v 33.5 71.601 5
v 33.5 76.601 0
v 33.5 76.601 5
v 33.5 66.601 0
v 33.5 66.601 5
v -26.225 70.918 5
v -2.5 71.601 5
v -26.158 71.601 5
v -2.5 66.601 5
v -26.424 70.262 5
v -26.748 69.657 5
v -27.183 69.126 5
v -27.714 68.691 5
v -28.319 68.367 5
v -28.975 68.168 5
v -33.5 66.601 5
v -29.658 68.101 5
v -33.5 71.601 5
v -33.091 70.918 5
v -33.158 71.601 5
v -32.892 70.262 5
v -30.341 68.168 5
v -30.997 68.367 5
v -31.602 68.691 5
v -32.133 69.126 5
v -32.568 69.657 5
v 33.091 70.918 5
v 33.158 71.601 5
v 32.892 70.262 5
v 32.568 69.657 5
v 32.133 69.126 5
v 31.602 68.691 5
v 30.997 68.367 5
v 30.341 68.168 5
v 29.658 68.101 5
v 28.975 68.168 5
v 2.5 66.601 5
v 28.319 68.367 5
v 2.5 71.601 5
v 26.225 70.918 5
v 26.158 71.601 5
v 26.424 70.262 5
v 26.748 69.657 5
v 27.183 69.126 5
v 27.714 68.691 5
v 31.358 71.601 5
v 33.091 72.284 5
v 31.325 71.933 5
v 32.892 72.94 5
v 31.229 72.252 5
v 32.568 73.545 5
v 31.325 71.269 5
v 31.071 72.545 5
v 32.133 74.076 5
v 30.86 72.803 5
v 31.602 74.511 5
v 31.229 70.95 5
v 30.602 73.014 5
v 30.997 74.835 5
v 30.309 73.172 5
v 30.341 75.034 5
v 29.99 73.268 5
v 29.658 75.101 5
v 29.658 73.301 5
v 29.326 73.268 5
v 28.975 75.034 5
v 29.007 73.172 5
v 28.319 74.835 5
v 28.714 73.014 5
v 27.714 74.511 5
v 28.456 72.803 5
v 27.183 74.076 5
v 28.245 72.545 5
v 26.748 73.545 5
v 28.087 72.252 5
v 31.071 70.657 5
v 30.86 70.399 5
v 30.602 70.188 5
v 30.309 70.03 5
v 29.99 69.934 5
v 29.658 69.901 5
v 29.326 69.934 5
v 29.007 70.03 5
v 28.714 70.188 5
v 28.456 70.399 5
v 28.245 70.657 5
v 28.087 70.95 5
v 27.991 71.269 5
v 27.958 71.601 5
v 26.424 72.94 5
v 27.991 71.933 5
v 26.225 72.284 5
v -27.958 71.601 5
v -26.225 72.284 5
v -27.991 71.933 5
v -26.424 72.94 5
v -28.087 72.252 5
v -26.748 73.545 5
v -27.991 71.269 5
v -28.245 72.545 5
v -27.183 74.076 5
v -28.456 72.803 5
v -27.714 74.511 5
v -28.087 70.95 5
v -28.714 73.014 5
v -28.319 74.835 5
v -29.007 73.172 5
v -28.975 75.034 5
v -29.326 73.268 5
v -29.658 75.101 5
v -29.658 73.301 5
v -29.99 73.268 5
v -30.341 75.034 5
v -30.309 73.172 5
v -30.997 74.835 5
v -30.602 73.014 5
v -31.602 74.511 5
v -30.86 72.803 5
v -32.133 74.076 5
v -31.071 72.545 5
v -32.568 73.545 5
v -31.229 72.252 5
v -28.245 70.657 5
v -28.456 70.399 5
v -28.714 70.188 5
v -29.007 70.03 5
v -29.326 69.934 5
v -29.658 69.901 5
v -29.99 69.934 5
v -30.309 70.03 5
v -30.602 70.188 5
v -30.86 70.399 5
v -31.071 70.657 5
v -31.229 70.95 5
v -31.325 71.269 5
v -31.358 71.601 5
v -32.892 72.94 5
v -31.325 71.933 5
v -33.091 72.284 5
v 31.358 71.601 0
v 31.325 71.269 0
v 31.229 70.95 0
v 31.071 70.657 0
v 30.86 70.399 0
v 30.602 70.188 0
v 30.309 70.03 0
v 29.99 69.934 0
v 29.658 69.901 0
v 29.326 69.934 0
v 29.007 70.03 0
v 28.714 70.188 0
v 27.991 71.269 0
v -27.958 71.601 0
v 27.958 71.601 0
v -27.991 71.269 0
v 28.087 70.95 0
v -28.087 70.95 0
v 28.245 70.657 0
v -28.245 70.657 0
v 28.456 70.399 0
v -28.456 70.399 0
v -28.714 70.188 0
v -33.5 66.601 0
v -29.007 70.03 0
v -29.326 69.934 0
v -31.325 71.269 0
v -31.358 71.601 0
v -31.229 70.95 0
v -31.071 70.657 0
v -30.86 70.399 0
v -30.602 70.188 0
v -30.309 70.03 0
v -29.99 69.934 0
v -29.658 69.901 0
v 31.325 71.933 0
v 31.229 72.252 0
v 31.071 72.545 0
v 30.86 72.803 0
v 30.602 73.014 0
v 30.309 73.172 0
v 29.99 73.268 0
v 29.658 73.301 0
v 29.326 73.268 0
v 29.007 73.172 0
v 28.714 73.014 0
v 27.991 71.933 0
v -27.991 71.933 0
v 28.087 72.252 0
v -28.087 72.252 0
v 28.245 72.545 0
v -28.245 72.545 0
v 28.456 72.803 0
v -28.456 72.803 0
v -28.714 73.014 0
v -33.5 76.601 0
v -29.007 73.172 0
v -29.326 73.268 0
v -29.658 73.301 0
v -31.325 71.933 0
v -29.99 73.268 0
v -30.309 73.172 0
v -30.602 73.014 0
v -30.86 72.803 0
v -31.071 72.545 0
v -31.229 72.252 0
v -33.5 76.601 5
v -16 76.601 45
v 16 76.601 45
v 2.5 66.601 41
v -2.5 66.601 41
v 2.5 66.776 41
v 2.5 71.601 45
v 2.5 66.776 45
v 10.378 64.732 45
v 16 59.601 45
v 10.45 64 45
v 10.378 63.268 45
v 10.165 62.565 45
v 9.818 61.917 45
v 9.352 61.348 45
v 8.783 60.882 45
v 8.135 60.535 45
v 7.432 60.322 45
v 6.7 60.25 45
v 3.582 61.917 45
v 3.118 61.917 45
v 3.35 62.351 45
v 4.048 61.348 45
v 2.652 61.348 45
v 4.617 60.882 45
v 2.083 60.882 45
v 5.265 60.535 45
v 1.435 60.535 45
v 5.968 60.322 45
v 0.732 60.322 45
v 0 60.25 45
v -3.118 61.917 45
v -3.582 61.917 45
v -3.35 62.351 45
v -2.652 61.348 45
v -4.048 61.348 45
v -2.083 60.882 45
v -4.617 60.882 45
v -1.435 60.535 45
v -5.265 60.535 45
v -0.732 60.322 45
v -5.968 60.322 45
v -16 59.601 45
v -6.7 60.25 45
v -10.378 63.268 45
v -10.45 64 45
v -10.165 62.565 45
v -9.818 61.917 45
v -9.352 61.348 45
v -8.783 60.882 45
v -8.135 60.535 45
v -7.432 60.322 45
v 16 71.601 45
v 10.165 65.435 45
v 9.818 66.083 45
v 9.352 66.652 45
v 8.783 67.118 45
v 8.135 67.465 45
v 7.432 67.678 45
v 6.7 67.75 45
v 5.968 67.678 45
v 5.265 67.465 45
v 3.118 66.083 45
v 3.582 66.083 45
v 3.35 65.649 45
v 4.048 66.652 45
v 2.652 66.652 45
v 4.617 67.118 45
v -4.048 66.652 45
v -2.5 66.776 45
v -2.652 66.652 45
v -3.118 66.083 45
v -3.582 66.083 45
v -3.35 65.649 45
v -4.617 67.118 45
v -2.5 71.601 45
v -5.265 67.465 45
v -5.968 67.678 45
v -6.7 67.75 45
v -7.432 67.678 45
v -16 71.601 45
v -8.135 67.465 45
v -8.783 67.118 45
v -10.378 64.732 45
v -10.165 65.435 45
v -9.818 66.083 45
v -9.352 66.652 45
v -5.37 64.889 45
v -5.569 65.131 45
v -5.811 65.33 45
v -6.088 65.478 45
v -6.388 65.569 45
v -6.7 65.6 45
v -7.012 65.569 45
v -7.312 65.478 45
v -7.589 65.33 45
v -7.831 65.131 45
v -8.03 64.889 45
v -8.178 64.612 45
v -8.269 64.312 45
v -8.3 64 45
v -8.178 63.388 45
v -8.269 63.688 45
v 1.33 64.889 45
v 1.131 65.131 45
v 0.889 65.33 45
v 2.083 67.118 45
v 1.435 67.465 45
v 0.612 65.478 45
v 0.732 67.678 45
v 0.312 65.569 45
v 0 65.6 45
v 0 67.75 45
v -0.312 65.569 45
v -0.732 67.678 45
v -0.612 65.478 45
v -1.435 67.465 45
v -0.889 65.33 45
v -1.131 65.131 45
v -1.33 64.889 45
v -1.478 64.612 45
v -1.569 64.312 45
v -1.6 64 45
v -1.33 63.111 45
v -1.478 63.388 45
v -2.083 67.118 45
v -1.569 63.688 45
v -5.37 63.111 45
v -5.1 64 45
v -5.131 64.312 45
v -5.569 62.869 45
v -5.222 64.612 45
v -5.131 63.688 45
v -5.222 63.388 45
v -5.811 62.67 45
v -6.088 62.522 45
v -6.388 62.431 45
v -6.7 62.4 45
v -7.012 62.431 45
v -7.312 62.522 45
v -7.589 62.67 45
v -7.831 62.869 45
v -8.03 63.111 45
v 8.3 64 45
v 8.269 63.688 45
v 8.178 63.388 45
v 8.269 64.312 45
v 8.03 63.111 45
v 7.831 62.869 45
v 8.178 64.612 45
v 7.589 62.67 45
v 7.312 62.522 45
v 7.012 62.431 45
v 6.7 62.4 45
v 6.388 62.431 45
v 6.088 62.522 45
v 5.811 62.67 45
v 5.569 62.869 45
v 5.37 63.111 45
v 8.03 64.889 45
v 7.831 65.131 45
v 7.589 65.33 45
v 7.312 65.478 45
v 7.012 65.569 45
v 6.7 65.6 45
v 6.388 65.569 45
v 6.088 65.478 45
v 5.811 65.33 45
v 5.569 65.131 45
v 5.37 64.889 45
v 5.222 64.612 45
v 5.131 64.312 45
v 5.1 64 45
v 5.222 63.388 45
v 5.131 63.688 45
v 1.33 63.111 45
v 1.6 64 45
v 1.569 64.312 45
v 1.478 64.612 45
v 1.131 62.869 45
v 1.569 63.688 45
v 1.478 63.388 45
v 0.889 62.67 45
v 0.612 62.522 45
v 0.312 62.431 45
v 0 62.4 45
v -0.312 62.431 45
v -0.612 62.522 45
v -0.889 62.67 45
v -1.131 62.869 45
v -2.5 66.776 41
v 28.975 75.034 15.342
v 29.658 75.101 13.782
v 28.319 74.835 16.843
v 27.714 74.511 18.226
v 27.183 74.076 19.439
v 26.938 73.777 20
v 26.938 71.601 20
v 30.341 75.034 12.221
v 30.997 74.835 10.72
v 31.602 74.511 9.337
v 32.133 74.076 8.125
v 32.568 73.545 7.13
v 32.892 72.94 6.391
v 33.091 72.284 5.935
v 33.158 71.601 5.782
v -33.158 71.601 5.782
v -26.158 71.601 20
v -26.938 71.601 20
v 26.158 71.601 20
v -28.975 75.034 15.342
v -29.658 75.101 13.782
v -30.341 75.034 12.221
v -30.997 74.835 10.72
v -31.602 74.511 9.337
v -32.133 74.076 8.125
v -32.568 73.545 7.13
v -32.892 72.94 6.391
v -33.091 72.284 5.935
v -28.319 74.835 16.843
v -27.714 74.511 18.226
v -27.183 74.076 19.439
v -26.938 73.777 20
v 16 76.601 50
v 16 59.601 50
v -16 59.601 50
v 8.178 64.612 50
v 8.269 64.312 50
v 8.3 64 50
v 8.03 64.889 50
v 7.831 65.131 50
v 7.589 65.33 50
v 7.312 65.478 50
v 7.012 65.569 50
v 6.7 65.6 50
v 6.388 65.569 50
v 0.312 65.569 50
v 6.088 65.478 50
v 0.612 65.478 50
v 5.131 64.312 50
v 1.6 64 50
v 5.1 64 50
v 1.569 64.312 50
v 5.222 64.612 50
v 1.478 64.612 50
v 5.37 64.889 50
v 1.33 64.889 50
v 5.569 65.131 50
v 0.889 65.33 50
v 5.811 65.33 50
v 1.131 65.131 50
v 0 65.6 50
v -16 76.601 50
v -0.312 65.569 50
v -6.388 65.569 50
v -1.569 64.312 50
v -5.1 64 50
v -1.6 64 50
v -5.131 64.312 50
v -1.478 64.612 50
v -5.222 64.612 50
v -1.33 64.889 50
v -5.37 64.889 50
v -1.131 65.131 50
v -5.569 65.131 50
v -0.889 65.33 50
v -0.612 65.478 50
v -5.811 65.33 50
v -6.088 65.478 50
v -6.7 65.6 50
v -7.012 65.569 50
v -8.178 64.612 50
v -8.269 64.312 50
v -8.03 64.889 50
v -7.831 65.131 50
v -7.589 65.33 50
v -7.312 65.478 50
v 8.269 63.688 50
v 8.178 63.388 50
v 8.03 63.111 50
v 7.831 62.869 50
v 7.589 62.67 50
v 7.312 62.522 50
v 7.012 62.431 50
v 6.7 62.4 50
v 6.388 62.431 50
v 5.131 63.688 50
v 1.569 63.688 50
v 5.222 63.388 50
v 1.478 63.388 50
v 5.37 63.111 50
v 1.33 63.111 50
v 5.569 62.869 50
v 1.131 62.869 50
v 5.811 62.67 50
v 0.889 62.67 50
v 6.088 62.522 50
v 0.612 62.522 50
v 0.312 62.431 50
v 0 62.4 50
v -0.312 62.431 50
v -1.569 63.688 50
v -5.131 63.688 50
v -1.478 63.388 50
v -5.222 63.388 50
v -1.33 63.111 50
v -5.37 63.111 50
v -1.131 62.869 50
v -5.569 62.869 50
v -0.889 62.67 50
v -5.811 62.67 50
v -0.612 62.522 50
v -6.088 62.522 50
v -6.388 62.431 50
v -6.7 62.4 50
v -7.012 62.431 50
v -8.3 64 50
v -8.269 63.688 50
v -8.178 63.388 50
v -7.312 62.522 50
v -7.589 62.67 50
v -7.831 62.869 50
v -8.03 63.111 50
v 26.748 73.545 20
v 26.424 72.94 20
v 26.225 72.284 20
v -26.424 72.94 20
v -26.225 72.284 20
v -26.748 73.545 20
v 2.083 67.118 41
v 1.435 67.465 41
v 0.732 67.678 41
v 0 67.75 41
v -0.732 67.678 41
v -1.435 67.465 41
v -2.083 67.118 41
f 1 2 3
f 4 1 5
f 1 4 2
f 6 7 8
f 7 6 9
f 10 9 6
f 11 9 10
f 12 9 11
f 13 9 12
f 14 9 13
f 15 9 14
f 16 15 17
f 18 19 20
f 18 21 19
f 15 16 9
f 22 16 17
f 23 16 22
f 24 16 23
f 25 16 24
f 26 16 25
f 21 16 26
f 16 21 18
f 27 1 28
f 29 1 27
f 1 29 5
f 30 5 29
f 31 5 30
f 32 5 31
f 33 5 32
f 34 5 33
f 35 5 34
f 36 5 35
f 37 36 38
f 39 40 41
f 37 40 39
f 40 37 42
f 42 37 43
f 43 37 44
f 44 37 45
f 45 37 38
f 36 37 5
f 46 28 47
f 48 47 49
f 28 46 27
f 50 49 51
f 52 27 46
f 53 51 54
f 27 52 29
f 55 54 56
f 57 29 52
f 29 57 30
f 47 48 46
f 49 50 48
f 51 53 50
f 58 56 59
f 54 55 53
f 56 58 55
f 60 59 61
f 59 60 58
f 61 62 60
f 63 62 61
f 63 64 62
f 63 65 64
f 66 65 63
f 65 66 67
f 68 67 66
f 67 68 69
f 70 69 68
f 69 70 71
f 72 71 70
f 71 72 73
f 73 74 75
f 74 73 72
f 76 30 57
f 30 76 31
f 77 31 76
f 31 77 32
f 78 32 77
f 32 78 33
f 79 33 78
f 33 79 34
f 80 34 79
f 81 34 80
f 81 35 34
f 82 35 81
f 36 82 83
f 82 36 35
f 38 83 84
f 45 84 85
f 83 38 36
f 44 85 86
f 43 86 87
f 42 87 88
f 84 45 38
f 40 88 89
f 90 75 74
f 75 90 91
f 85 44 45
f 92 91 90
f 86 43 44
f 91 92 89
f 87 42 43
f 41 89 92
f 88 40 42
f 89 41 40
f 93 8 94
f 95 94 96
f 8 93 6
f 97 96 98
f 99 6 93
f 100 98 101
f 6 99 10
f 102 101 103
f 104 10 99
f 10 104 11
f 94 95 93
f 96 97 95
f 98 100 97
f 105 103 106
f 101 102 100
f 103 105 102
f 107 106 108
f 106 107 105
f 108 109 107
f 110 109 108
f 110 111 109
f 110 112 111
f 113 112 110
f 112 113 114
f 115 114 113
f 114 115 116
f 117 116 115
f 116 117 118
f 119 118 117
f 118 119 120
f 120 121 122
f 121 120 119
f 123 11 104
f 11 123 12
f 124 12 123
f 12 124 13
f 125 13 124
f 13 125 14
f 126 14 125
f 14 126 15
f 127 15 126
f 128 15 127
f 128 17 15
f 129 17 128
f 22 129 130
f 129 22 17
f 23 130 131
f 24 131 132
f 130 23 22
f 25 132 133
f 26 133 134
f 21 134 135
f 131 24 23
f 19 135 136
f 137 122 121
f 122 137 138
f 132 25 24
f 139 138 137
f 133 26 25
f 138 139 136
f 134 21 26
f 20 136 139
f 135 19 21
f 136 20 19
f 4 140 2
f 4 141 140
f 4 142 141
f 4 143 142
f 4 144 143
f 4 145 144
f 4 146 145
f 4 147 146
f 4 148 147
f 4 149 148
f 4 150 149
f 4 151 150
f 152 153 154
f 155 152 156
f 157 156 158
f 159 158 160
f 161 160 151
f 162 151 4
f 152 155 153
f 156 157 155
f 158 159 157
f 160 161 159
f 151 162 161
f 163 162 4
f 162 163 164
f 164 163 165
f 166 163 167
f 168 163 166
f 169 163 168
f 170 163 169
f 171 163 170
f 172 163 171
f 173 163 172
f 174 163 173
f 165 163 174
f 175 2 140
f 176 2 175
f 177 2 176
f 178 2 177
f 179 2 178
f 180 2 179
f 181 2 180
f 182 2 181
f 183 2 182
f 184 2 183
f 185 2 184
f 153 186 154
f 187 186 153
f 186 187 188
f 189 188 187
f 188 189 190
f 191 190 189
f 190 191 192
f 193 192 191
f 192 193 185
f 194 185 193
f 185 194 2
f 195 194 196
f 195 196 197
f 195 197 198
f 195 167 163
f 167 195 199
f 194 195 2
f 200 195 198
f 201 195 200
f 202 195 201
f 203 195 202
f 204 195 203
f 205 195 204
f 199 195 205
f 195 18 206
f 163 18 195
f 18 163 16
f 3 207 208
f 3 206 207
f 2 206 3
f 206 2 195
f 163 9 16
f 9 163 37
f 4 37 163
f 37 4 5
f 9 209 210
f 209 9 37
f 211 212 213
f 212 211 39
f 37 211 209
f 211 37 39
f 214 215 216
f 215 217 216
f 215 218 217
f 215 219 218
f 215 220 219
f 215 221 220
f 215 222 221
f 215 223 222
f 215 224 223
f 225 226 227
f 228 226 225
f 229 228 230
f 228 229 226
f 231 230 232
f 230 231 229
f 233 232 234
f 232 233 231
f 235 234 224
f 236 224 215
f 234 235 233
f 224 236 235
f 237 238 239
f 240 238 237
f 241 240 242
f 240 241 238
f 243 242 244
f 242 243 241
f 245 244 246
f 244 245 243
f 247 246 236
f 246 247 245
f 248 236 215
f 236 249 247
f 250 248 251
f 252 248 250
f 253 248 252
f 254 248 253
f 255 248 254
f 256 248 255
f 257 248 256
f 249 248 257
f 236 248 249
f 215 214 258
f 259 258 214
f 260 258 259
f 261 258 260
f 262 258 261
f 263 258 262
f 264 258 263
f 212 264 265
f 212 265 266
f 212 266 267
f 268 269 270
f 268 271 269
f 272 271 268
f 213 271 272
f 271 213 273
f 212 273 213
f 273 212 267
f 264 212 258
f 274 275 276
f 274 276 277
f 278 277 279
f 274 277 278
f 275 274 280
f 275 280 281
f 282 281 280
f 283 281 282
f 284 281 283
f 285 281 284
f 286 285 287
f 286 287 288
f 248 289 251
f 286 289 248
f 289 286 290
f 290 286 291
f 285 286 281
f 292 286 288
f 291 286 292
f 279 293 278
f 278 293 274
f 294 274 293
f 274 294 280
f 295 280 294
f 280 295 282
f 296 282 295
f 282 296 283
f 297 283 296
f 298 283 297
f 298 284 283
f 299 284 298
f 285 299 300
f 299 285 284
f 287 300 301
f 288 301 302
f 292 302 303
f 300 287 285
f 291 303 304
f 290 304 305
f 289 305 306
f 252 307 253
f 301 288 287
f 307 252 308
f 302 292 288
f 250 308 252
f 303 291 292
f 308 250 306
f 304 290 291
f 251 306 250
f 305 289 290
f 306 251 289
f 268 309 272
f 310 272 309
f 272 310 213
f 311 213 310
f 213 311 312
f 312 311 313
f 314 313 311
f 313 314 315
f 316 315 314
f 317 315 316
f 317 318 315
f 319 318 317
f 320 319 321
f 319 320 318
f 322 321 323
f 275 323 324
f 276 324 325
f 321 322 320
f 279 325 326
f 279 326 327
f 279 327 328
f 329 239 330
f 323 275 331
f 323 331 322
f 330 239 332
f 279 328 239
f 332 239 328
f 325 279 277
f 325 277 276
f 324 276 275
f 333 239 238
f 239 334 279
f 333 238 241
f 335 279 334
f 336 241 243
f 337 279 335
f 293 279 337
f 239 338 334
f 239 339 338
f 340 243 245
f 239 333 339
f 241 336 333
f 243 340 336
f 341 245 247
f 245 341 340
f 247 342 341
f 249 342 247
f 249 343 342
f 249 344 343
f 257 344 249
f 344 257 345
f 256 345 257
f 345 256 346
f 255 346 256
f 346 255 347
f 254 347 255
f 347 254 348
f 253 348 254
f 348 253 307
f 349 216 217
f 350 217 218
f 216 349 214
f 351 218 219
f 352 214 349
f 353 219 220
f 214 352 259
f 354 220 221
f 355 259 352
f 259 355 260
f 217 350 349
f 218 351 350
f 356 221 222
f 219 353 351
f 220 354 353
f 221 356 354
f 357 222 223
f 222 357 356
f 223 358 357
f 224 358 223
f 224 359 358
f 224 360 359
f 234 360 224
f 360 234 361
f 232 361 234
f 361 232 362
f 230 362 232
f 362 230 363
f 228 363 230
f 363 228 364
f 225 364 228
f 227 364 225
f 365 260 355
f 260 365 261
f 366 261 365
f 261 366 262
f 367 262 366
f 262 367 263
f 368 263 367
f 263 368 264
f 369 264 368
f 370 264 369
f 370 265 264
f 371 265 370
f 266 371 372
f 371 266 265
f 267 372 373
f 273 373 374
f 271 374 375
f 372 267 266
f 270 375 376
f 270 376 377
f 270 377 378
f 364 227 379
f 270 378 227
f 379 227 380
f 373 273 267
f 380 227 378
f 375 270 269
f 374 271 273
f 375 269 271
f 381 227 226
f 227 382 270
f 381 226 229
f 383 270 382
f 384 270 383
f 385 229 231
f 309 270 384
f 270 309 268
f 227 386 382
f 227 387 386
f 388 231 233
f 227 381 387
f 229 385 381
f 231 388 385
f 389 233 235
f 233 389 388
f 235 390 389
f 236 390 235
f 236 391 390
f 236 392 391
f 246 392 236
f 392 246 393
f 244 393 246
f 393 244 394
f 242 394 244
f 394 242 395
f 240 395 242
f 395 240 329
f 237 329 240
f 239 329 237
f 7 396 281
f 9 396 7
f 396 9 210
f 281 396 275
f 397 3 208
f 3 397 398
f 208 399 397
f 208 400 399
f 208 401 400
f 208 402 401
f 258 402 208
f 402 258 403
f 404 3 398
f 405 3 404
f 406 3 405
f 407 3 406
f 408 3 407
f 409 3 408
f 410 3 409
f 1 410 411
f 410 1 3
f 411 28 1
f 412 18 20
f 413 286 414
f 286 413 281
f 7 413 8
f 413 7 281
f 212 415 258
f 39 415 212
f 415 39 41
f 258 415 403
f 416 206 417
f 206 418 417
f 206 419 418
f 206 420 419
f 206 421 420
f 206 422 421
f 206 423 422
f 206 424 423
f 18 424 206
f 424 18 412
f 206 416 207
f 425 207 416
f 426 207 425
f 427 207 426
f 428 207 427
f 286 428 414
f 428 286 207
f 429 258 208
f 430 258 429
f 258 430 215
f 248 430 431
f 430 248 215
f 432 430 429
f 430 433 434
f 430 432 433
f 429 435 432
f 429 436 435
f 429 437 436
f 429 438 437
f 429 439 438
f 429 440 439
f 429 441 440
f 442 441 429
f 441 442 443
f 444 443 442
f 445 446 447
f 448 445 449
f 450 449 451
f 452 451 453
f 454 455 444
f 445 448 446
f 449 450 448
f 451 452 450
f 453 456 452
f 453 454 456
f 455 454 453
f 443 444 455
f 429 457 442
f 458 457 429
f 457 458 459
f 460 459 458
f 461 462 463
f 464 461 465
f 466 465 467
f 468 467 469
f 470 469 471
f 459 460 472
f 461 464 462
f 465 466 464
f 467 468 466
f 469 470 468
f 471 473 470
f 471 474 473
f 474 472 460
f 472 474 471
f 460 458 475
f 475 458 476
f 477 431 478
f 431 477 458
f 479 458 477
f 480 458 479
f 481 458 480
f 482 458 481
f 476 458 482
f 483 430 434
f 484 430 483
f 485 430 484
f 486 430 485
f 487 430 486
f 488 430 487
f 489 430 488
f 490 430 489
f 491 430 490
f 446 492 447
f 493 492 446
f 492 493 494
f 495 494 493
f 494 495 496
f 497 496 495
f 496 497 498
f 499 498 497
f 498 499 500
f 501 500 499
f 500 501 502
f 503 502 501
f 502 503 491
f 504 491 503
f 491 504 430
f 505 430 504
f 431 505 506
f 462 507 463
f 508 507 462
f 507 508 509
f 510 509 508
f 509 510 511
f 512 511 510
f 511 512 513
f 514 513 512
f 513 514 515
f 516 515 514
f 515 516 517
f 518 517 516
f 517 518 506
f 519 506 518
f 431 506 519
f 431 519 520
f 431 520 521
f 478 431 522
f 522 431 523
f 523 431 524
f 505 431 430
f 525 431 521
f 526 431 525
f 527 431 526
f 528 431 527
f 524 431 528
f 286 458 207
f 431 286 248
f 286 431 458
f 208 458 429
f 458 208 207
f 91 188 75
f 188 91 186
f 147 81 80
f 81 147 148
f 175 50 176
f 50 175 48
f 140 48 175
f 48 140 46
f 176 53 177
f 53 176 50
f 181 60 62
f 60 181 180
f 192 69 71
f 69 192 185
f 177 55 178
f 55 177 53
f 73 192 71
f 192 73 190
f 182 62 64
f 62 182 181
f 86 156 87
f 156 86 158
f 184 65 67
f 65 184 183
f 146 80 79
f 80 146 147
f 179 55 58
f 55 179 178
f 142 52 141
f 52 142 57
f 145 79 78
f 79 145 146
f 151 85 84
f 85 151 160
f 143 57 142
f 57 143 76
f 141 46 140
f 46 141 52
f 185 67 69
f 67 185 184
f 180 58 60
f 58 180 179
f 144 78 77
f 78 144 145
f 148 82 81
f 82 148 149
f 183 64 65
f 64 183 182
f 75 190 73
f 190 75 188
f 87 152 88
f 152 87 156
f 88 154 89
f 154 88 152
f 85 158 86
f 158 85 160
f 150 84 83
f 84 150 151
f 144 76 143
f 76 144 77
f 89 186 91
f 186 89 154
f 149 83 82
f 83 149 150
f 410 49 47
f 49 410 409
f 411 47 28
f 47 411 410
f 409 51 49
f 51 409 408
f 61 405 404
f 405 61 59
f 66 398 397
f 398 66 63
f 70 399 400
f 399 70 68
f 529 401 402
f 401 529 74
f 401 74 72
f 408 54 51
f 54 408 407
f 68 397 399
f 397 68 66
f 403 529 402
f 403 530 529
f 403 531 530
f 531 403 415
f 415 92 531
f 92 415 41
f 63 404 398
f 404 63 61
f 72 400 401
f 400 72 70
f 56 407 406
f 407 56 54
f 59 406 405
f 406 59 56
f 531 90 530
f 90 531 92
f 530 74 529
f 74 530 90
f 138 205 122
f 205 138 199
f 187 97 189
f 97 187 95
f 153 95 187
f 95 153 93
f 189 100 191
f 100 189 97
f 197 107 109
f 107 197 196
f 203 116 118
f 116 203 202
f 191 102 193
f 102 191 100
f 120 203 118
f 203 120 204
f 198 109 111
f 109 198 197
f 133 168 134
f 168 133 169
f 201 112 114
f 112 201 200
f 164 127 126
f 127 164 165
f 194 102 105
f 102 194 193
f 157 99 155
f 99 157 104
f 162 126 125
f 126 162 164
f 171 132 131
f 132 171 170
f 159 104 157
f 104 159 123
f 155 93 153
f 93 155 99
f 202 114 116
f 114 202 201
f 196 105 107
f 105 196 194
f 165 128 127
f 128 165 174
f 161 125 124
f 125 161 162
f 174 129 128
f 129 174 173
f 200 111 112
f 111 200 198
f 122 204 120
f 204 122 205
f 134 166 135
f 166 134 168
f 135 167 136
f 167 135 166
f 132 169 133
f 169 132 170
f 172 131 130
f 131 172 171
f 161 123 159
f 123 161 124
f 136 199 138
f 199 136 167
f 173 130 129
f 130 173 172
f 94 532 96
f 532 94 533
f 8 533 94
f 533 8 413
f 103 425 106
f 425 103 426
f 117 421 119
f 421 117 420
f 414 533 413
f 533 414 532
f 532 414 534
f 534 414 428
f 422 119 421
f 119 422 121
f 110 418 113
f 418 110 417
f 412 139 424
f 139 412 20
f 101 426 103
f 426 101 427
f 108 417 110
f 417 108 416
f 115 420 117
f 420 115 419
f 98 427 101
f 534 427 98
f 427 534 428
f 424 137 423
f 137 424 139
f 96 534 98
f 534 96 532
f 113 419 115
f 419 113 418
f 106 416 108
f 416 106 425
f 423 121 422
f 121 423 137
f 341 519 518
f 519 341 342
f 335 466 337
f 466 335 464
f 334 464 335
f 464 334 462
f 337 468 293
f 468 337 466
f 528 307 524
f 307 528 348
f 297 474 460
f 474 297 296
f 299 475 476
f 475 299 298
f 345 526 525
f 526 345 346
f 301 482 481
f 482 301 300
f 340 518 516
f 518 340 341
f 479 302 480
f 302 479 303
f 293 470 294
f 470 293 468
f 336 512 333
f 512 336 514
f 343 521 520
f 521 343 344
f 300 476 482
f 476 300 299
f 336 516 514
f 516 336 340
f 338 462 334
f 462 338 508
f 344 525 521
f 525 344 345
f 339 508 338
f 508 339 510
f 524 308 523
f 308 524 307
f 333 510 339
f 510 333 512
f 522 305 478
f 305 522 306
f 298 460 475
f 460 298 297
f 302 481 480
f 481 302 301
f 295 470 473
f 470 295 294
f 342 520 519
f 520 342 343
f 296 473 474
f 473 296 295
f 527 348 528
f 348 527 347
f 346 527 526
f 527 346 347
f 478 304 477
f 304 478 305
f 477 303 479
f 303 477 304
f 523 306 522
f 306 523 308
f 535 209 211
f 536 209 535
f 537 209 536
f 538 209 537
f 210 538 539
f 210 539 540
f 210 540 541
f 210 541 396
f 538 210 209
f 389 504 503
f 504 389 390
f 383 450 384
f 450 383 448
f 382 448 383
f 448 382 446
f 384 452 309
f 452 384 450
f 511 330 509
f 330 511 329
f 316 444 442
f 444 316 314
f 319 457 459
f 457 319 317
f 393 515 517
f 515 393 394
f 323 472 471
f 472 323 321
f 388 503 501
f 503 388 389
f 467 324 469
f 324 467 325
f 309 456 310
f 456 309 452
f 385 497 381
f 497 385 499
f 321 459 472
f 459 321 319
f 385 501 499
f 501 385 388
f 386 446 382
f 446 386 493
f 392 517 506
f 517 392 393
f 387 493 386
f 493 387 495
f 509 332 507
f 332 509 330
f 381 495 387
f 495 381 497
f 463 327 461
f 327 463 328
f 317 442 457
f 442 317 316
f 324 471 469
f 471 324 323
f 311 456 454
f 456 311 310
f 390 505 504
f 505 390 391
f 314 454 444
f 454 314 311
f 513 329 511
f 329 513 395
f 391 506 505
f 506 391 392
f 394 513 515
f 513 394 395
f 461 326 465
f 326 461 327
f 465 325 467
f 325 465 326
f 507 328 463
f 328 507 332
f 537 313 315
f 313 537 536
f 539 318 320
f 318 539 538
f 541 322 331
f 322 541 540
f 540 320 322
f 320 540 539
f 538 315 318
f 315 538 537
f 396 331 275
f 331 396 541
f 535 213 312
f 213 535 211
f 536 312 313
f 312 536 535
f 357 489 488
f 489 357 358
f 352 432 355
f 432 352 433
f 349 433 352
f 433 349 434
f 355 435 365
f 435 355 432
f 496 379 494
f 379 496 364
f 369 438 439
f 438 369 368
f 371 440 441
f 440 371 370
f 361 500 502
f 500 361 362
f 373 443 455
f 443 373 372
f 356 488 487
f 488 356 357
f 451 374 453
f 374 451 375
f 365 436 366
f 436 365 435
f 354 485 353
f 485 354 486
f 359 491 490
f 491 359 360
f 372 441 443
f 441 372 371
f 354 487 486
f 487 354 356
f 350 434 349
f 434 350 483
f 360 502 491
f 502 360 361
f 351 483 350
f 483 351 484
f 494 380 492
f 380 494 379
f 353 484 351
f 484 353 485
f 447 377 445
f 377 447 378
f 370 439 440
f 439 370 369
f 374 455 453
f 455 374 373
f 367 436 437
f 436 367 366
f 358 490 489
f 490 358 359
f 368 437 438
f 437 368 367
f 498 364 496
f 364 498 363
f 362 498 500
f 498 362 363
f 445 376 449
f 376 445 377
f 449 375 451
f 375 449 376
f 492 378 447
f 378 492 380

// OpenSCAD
// portal_tee_v3_1 — v3.1 偏心屏实验 (2026-07-31)
// ⚠ 主体几何可读副本; 实际打印件以 STL 为准 (让位/布尔特征无法在 SCAD 复刻)
// portal_tee_v3 — v3 屏幕底部支撑 T 型件 (与 build_tee.py 同参, 2026-07-23 终版)。
// 盘系 Z0=承载面; ×2 (第二件绕 Z 转 180°); 平躺打印 (外侧面 Y=76.601 贴床) 零支撑。
// 底横条装转子两颗 M3; 梯形加强壁齐外侧面; 顶平板托梯形 (托面 Z50=屏底), 内边 13.4=屏厚;
// 屏孔 (0,64) M3×12 + Φ7.5×4 帽让位窝; 2×Φ7 工艺井过壁。

bar_x=33.5; bar_h=5; y0=66.601; y1=76.601;      // 底横条 67×10×5
stem_hw=2.5; stem_z1=50;                        // 竖梃 5×10
gus_t=5; gy0=y1-gus_t;                          // 梯形壁厚 5, 齐外侧
pad_t=5; pad_z0=stem_z1-pad_t;                  // 顶托 Z45..50
pad_y0=59.601; pad_wi=16; pad_wo=16;   // v3.1: 顶托改等宽 ±16           // 托梯形: 内 ±6.7, 外 ±10
foot_holes=[[29.658,71.601],[-29.658,71.601]];
well_d=7; well_z1=20;
scr_y=64;
scr_ecc=6.7;                        // v3.1 偏心量
scr_xs=[-scr_ecc,0,scr_ecc];        // 3 个离散屏孔位

difference(){
  union(){
    translate([-bar_x,y0,0]) cube([2*bar_x,y1-y0,bar_h]);            // 底横条
    translate([-stem_hw,y0,bar_h]) cube([2*stem_hw,y1-y0,pad_z0-bar_h]); // 竖梃
    translate([0,gy0+gus_t,0]) rotate([90,0,0]) linear_extrude(gus_t)    // 梯形壁
      polygon([[-bar_x,bar_h],[bar_x,bar_h],[pad_wo,pad_z0],[-pad_wo,pad_z0]]);
    translate([0,0,pad_z0]) linear_extrude(pad_t)                        // 顶平板托
      polygon([[pad_wo,y1],[-pad_wo,y1],[-pad_wi,pad_y0],[pad_wi,pad_y0]]);
  }
  for(h=foot_holes){
    translate([h[0],h[1],-1]) cylinder(h=bar_h+2, d=3.4, $fn=32);        // 脚孔
    translate([h[0],h[1],bar_h]) cylinder(h=well_z1-bar_h, d=well_d, $fn=32);  // 工艺井
  }
  for (sx = scr_xs) {                                                    // v3.1: 3 个离散屏孔
    translate([sx,scr_y,pad_z0-1]) cylinder(h=pad_t+2, d=3.2, $fn=32);   // 屏孔
    translate([sx,scr_y,pad_z0-4]) cylinder(h=4, d=7.5, $fn=32);         // 帽让位窝
  }
}
